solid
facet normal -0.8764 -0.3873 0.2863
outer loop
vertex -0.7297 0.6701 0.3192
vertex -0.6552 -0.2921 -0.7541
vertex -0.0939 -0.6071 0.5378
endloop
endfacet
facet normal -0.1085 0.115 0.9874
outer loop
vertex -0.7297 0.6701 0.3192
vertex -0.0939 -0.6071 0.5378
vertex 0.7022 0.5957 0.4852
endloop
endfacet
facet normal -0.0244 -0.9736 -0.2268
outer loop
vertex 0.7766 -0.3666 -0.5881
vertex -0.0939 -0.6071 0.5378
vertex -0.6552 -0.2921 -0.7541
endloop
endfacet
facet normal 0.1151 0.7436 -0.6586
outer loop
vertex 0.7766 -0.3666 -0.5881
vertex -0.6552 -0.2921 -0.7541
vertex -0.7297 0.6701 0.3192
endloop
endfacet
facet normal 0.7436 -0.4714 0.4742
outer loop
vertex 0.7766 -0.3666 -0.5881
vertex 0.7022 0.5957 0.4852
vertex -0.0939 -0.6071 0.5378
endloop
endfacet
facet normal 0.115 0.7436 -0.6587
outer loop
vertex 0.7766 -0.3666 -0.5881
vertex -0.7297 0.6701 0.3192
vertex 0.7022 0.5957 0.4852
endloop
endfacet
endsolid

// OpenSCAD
// file: pointhull.scad
function _slice(list,start,end=undef) =
    let(end = end==undef?len(list):end)
    [for(i=[start:1:end-1]) list[i]];
        
function _delete(list,pos) =
    let(l=len(list))
    pos == 0 ? [for(i=[1:1:l-1]) list[i]] :
    pos >= l-1 ? [for(i=[0:1:pos-1]) list[i]] :
    concat([for(i=[0:1:pos-1]) list[i]],
        [for(i=[pos+1:1:l-1]) list[i]]);

function _areCollinear(a,b,c) = cross(b-a,c-a) == [0,0,0];
        
function _areCoplanar(a,b,c,d) = (d-a)*cross(b-a,c-a) == 0;
    
function _findNoncollinear(list,point1,point2,pos=0) = 
    pos >= len(list) ? undef :
    ! _areCollinear(point1,point2,list[pos]) ? pos :
    _findNoncollinear(list,point1,point2,pos=pos+1);
        
function _findNoncoplanar(list,point1,point2,point3,pos=0) =
   pos >= len(list) ? undef :
   ! _areCoplanar(point1,point2,point3,list[pos]) ? pos : 
        _findNoncoplanar(list,point1,point2,point3,pos=pos+1);
        
function _isBoundedBy(a,face,strict=false) =
    cross(face[1]-face[0],face[2]-face[0])*(a-face[0]);
        
function _makeTet(a,b,c,d) =
    _isBoundedBy(d,[a,b,c]) >= 0 ? 
        [[a,b,c],[b,a,d],[c,b,d],[a,c,d]] :
        [[c,b,a],[d,a,b],[d,b,c],[d,c,a]];

function _findTri(list) = 
    let(l2=_unique(list))
    assert(len(l2)>=3)
    let(a=l2[0],
        b=l2[1],
        l3=_slice(l2,2),
        ci=_findNoncollinear(l3,a,b),        
        c=assert(ci != undef) l3[ci],
        l4=_delete(l3,ci))
        [[a,b,c],l4];
        
function _findTet(list) = 
    let(ft=_findTri(list),
        tri=ft[0],
        l4=ft[1],
        di=assert(len(l4)>0) _findNoncoplanar(l4,tri[0],tri[1],tri[2]),
        d=assert(di != undef) l4[di],
        l5=_delete(l4,di))
        [_makeTet(tri[0],tri[1],tri[2],d),l5];
    
function _find(list,value) =
    let(m=search([value],list,1)[0]) 
    m==[] ? undef : m;
           
function _unique(list,soFar=[],pos=0) =
    pos >= len(list) ? soFar :
    _find(soFar,list[pos]) == undef ? _unique(list,soFar=concat(soFar,[list[pos]]),pos=pos+1) :
    _unique(list,soFar=soFar,pos=pos+1);
    
function _makePointsAndFaces(triangles) =
    let(points=_unique([for(t=triangles) for(v=t) v]))
        [points, [for(t=triangles) [for(v=t) _find(points,v)]]];

function _sameSide(p1,p2, a,b) = 
    let(cp1 = cross(b-a, p1-a),
        cp2 = cross(b-a, p2-a)) 
        cp1*cp2 >= 0;

function _insideTriangle(p, t) = 
    _sameSide(p,t[0],t[1],t[2]) &&
    _sameSide(p,t[1],t[0],t[2]) &&
    _sameSide(p,t[2],t[0],t[1]);
            
            
function _satisfiesConstraint(p, triangle) =
    let(c=_isBoundedBy(p, triangle))
    c > 0 || (c == 0 && _insideTriangle(p, triangle));
    
            
function _insidePoly(p, triangles, pos=0) = 
    pos >= len(triangles) ? true :
    !_satisfiesConstraint(p, triangles[pos]) ? false :
    _insidePoly(p, triangles, pos=pos+1);
        
function _outerEdges(triangles) =
        let(edges=[for(t=triangles) for(e=[[t[0],t[1]],
                [t[1],t[2]],
                [t[2],t[0]]]) e])
        [for(e=edges) if(undef == _find(edges,[e[1],e[0]])) e];
                
function _unlit(triangles, p) = [for(t=triangles) if(_isBoundedBy(p, t) >= 0) t];
        
function _addToHull(h, p) = 
    let(unlit = _unlit(h,p),
        edges = _outerEdges(unlit))
        concat(unlit, [for(e=edges) [e[1],e[0],p]]);

function _expandHull(h, points, pos=0) =
    pos >= len(points) ? h :
    !_insidePoly(points[pos],h) ?  _expandHull(_addToHull(h,points[pos]),points,pos=pos+1) :
    _expandHull(h, points, pos=pos+1);
            
function pointHull3D(points) =
    let(ft=_findTet(points))
        _expandHull(ft[0], ft[1]);
        
function _traceEdges(edgeStarts,edgeEnds,soFar=undef) =
    soFar==undef ? _traceEdges(edgeStarts,edgeEnds,[edgeStarts[0]]) :
    assert(soFar[len(soFar)-1] != undef)
    len(soFar)>1 && soFar[len(soFar)-1] == soFar[0] ? _slice(soFar,1) :
    _traceEdges(edgeStarts,edgeEnds,soFar=concat(soFar,[edgeEnds[_find(edgeStarts,soFar[len(soFar)-1])]]));
        
function _project(v) = [v[0],v[1]];
        
function pointHull2D(points) = 
    let(
        p3d = concat([[0,0,1]], 
            [for(p=points) [p[0],p[1],0]]),
        h = pointHull3D(p3d),
        edgeStarts = [for(t=h) if(t[0][2]==1 || t[1][2]==1 || t[2][2]==1)
                t[0][2]==1 ? _project(t[1]) : 
                t[1][2]==1 ? _project(t[2]) :
                _project(t[0]) ],
        edgeEnds = [for(t=h) if(t[0][2]==1 || t[1][2]==1 || t[2][2]==1)
                t[0][2]==1 ? _project(t[2]) : 
                t[1][2]==1 ? _project(t[0]) :
                _project(t[1]) ])
        _traceEdges(edgeStarts,edgeEnds,soFar=[edgeStarts[0]]);

function pointHull(points) =
    len(points[0]) == 2 ? pointHull2D(points) :
        pointHull3D(points);

module pointHull(points) {
    if (len(points[0])==2) {
        polygon(pointHull2D(points));
    }
    else {
        paf = _makePointsAndFaces(pointHull3D(points));
        polyhedron(points=paf[0],faces=paf[1]);
    }
}

function extractPointsFromHull(h) =
    _unique(
        is_num(h[0][0]) ? h : [for(t=h) for(v=t) v] );

function _d22(a00,a01,a10,a11) = a00*a11-a01*a10;

function _determinant3x3(m) = m[0][0]*_d22(m[1][1],m[1][2],m[2][1],m[2][2])
    -m[0][1]*_d22(m[1][0],m[1][2],m[2][0],m[2][2])
    +m[0][2]*_d22(m[1][0],m[1][1],m[2][0],m[2][1]);
        
function _determinant2x2(m) = _d22(m[0][0],m[0][1],m[1][0],m[1][1]);

// Cramer's rule
// n.b. Determinant of matrix is the same as of its transpose
function _solve3(a,b,c) = 
    let(det=_determinant3x3([a[0],b[0],c[0]]))
    det == 0 ? undef :
    let(rhs=[a[1],b[1],c[1]],
        col0=[a[0][0],b[0][0],c[0][0]],
        col1=[a[0][1],b[0][1],c[0][1]],
        col2=[a[0][2],b[0][2],c[0][2]])
    [_determinant3x3([rhs,col1,col2]),
    _determinant3x3([col0,rhs,col2]),
    _determinant3x3([col0,col1,rhs])]/det;
        
function _solve2(a,b) =
    let(det=_determinant2x2([a[0],b[0]]))
    det == 0 ? undef :
    let(rhs=[a[1],b[1]],
        col0=[a[0][0],b[0][0]],
        col1=[a[0][1],b[0][1]])
    [_determinant2x2([rhs,col1]),
    _determinant2x2([col0,rhs])]/det;
        
function _satisfies(p,constraint) =
    p*constraint[0] <= constraint[1];

function _linearConstraintExtrema(constraints,constraintsMarked=false) =
        let(c=_unique(constraints),
            n=len(c))
        len(c[0][0]) == 3 ?
        [
        for(i=[0:1:n-1]) for(j=[i+1:1:n-1]) for(k=[j+1:1:n-1]) let(p=_solve3(c[i],c[j],c[k])) if(p!=undef && _satisfiesAll(p,c,except1=i,except2=j,except3=k)) constraintsMarked?[p,[i,j,k]]:p
        ] :
        [
        for(i=[0:1:n-1]) for(j=[i+1:1:n-1]) let(p=_solve2(c[i],c[j])) if(p!=undef && _satisfiesAll(p,c,except1=i,except2=j)) constraintsMarked?[p,[i,j,-1]]:p
        ];
        
function _satisfiesAll(p,c,except1=undef,except2=undef,except3=undef,pos=0) = 
        pos >= len(c) ? true :
        except1 == pos || except2 == pos || except3 == pos || _satisfies(p,c[pos]) ? _satisfiesAll(p,c,except1,except2,except3,pos=pos+1) : 
        false;
       

module linearConstraintShape(constraints) {
    pointHull(_linearConstraintExtrema(constraints));
}

// 3D inly
function _onPlane(v,planeIndex,data,pos=0) = 
    pos >= len(data) ? false :
    data[pos][0] == v && (data[pos][1][0] == planeIndex || data[pos][1][1] == planeIndex || data[pos][1][2] == planeIndex) ? true :
    _onPlane(v,planeIndex,data,pos=pos+1);

// 3D only
function _getFaceOnPlane(planeIndex,triangles,data) =
    let(trianglesOnPlane = [for(t=triangles) if (_onPlane(t[0],planeIndex,data) &&
        _onPlane(t[1],planeIndex,data) &&
        _onPlane(t[2],planeIndex,data)) t],
        outer = _outerEdges(trianglesOnPlane),
        edgeStarts = [for(e=outer) e[0]],
        edgeEnds = [for(e=outer) e[1]]
    ) len(outer) == 0 ? undef : echo("se",edgeStarts,edgeEnds) _traceEdges(edgeStarts,edgeEnds);

// 3D only, does not work if there are multiple planes defined by the same constraint
function linearConstraintPointsAndFaces(constraints) =
    let(data=_linearConstraintExtrema(constraints,constraintsMarked=true),
    extremePoints=[for(d=data) d[0]],
        
    triangles=pointHull(extremePoints),
    hullPoints=extractPointsFromHull(triangles),
    faces=[for (i=[0:len(constraints)-1]) [for(v=_getFaceOnPlane(i,triangles,data)) if(v != undef) _find(hullPoints,v)]]
    )
    [hullPoints,faces];

function hullPoints(points) =
    extractPointsFromHull(pointHull(points));

module dualHull(points) {
    p = hullPoints(points);
    constraints = [for(v=p) [v,v*v]];
    linearConstraintShape(constraints);
}

//<skip>
cubePoints = [for(i=[-10,10]) for(j=[-10,10]) for(k=[-10,10]) [i,j,k]];        
pointHull(cubePoints);
translate([45,0,0]) dualHull(cubePoints);
octaPoints = [for(i=[-10,10]) for(j=[0:2]) [for(k=[0:2]) k==j?i:0]];
echo(octaPoints);
translate([90,0,0]) dualHull(octaPoints);
//</skip>
// main file
use <pointhull.scad>;

v = [
	-0.729665, 0.670121, 0.319155,
	-0.655235, -0.292130, -0.754096,
	-0.093922, -0.607123, 0.537818,
	0.702196, 0.595691, 0.485187,
	0.776626, -0.366560, -0.588064,
];

function splitVertices(list) = let(n=len(list)/3) [for(i=[0:n-1]) [list[3*i],list[3*i+1],list[3*i+2]]];
    
pointHull(splitVertices(v));
